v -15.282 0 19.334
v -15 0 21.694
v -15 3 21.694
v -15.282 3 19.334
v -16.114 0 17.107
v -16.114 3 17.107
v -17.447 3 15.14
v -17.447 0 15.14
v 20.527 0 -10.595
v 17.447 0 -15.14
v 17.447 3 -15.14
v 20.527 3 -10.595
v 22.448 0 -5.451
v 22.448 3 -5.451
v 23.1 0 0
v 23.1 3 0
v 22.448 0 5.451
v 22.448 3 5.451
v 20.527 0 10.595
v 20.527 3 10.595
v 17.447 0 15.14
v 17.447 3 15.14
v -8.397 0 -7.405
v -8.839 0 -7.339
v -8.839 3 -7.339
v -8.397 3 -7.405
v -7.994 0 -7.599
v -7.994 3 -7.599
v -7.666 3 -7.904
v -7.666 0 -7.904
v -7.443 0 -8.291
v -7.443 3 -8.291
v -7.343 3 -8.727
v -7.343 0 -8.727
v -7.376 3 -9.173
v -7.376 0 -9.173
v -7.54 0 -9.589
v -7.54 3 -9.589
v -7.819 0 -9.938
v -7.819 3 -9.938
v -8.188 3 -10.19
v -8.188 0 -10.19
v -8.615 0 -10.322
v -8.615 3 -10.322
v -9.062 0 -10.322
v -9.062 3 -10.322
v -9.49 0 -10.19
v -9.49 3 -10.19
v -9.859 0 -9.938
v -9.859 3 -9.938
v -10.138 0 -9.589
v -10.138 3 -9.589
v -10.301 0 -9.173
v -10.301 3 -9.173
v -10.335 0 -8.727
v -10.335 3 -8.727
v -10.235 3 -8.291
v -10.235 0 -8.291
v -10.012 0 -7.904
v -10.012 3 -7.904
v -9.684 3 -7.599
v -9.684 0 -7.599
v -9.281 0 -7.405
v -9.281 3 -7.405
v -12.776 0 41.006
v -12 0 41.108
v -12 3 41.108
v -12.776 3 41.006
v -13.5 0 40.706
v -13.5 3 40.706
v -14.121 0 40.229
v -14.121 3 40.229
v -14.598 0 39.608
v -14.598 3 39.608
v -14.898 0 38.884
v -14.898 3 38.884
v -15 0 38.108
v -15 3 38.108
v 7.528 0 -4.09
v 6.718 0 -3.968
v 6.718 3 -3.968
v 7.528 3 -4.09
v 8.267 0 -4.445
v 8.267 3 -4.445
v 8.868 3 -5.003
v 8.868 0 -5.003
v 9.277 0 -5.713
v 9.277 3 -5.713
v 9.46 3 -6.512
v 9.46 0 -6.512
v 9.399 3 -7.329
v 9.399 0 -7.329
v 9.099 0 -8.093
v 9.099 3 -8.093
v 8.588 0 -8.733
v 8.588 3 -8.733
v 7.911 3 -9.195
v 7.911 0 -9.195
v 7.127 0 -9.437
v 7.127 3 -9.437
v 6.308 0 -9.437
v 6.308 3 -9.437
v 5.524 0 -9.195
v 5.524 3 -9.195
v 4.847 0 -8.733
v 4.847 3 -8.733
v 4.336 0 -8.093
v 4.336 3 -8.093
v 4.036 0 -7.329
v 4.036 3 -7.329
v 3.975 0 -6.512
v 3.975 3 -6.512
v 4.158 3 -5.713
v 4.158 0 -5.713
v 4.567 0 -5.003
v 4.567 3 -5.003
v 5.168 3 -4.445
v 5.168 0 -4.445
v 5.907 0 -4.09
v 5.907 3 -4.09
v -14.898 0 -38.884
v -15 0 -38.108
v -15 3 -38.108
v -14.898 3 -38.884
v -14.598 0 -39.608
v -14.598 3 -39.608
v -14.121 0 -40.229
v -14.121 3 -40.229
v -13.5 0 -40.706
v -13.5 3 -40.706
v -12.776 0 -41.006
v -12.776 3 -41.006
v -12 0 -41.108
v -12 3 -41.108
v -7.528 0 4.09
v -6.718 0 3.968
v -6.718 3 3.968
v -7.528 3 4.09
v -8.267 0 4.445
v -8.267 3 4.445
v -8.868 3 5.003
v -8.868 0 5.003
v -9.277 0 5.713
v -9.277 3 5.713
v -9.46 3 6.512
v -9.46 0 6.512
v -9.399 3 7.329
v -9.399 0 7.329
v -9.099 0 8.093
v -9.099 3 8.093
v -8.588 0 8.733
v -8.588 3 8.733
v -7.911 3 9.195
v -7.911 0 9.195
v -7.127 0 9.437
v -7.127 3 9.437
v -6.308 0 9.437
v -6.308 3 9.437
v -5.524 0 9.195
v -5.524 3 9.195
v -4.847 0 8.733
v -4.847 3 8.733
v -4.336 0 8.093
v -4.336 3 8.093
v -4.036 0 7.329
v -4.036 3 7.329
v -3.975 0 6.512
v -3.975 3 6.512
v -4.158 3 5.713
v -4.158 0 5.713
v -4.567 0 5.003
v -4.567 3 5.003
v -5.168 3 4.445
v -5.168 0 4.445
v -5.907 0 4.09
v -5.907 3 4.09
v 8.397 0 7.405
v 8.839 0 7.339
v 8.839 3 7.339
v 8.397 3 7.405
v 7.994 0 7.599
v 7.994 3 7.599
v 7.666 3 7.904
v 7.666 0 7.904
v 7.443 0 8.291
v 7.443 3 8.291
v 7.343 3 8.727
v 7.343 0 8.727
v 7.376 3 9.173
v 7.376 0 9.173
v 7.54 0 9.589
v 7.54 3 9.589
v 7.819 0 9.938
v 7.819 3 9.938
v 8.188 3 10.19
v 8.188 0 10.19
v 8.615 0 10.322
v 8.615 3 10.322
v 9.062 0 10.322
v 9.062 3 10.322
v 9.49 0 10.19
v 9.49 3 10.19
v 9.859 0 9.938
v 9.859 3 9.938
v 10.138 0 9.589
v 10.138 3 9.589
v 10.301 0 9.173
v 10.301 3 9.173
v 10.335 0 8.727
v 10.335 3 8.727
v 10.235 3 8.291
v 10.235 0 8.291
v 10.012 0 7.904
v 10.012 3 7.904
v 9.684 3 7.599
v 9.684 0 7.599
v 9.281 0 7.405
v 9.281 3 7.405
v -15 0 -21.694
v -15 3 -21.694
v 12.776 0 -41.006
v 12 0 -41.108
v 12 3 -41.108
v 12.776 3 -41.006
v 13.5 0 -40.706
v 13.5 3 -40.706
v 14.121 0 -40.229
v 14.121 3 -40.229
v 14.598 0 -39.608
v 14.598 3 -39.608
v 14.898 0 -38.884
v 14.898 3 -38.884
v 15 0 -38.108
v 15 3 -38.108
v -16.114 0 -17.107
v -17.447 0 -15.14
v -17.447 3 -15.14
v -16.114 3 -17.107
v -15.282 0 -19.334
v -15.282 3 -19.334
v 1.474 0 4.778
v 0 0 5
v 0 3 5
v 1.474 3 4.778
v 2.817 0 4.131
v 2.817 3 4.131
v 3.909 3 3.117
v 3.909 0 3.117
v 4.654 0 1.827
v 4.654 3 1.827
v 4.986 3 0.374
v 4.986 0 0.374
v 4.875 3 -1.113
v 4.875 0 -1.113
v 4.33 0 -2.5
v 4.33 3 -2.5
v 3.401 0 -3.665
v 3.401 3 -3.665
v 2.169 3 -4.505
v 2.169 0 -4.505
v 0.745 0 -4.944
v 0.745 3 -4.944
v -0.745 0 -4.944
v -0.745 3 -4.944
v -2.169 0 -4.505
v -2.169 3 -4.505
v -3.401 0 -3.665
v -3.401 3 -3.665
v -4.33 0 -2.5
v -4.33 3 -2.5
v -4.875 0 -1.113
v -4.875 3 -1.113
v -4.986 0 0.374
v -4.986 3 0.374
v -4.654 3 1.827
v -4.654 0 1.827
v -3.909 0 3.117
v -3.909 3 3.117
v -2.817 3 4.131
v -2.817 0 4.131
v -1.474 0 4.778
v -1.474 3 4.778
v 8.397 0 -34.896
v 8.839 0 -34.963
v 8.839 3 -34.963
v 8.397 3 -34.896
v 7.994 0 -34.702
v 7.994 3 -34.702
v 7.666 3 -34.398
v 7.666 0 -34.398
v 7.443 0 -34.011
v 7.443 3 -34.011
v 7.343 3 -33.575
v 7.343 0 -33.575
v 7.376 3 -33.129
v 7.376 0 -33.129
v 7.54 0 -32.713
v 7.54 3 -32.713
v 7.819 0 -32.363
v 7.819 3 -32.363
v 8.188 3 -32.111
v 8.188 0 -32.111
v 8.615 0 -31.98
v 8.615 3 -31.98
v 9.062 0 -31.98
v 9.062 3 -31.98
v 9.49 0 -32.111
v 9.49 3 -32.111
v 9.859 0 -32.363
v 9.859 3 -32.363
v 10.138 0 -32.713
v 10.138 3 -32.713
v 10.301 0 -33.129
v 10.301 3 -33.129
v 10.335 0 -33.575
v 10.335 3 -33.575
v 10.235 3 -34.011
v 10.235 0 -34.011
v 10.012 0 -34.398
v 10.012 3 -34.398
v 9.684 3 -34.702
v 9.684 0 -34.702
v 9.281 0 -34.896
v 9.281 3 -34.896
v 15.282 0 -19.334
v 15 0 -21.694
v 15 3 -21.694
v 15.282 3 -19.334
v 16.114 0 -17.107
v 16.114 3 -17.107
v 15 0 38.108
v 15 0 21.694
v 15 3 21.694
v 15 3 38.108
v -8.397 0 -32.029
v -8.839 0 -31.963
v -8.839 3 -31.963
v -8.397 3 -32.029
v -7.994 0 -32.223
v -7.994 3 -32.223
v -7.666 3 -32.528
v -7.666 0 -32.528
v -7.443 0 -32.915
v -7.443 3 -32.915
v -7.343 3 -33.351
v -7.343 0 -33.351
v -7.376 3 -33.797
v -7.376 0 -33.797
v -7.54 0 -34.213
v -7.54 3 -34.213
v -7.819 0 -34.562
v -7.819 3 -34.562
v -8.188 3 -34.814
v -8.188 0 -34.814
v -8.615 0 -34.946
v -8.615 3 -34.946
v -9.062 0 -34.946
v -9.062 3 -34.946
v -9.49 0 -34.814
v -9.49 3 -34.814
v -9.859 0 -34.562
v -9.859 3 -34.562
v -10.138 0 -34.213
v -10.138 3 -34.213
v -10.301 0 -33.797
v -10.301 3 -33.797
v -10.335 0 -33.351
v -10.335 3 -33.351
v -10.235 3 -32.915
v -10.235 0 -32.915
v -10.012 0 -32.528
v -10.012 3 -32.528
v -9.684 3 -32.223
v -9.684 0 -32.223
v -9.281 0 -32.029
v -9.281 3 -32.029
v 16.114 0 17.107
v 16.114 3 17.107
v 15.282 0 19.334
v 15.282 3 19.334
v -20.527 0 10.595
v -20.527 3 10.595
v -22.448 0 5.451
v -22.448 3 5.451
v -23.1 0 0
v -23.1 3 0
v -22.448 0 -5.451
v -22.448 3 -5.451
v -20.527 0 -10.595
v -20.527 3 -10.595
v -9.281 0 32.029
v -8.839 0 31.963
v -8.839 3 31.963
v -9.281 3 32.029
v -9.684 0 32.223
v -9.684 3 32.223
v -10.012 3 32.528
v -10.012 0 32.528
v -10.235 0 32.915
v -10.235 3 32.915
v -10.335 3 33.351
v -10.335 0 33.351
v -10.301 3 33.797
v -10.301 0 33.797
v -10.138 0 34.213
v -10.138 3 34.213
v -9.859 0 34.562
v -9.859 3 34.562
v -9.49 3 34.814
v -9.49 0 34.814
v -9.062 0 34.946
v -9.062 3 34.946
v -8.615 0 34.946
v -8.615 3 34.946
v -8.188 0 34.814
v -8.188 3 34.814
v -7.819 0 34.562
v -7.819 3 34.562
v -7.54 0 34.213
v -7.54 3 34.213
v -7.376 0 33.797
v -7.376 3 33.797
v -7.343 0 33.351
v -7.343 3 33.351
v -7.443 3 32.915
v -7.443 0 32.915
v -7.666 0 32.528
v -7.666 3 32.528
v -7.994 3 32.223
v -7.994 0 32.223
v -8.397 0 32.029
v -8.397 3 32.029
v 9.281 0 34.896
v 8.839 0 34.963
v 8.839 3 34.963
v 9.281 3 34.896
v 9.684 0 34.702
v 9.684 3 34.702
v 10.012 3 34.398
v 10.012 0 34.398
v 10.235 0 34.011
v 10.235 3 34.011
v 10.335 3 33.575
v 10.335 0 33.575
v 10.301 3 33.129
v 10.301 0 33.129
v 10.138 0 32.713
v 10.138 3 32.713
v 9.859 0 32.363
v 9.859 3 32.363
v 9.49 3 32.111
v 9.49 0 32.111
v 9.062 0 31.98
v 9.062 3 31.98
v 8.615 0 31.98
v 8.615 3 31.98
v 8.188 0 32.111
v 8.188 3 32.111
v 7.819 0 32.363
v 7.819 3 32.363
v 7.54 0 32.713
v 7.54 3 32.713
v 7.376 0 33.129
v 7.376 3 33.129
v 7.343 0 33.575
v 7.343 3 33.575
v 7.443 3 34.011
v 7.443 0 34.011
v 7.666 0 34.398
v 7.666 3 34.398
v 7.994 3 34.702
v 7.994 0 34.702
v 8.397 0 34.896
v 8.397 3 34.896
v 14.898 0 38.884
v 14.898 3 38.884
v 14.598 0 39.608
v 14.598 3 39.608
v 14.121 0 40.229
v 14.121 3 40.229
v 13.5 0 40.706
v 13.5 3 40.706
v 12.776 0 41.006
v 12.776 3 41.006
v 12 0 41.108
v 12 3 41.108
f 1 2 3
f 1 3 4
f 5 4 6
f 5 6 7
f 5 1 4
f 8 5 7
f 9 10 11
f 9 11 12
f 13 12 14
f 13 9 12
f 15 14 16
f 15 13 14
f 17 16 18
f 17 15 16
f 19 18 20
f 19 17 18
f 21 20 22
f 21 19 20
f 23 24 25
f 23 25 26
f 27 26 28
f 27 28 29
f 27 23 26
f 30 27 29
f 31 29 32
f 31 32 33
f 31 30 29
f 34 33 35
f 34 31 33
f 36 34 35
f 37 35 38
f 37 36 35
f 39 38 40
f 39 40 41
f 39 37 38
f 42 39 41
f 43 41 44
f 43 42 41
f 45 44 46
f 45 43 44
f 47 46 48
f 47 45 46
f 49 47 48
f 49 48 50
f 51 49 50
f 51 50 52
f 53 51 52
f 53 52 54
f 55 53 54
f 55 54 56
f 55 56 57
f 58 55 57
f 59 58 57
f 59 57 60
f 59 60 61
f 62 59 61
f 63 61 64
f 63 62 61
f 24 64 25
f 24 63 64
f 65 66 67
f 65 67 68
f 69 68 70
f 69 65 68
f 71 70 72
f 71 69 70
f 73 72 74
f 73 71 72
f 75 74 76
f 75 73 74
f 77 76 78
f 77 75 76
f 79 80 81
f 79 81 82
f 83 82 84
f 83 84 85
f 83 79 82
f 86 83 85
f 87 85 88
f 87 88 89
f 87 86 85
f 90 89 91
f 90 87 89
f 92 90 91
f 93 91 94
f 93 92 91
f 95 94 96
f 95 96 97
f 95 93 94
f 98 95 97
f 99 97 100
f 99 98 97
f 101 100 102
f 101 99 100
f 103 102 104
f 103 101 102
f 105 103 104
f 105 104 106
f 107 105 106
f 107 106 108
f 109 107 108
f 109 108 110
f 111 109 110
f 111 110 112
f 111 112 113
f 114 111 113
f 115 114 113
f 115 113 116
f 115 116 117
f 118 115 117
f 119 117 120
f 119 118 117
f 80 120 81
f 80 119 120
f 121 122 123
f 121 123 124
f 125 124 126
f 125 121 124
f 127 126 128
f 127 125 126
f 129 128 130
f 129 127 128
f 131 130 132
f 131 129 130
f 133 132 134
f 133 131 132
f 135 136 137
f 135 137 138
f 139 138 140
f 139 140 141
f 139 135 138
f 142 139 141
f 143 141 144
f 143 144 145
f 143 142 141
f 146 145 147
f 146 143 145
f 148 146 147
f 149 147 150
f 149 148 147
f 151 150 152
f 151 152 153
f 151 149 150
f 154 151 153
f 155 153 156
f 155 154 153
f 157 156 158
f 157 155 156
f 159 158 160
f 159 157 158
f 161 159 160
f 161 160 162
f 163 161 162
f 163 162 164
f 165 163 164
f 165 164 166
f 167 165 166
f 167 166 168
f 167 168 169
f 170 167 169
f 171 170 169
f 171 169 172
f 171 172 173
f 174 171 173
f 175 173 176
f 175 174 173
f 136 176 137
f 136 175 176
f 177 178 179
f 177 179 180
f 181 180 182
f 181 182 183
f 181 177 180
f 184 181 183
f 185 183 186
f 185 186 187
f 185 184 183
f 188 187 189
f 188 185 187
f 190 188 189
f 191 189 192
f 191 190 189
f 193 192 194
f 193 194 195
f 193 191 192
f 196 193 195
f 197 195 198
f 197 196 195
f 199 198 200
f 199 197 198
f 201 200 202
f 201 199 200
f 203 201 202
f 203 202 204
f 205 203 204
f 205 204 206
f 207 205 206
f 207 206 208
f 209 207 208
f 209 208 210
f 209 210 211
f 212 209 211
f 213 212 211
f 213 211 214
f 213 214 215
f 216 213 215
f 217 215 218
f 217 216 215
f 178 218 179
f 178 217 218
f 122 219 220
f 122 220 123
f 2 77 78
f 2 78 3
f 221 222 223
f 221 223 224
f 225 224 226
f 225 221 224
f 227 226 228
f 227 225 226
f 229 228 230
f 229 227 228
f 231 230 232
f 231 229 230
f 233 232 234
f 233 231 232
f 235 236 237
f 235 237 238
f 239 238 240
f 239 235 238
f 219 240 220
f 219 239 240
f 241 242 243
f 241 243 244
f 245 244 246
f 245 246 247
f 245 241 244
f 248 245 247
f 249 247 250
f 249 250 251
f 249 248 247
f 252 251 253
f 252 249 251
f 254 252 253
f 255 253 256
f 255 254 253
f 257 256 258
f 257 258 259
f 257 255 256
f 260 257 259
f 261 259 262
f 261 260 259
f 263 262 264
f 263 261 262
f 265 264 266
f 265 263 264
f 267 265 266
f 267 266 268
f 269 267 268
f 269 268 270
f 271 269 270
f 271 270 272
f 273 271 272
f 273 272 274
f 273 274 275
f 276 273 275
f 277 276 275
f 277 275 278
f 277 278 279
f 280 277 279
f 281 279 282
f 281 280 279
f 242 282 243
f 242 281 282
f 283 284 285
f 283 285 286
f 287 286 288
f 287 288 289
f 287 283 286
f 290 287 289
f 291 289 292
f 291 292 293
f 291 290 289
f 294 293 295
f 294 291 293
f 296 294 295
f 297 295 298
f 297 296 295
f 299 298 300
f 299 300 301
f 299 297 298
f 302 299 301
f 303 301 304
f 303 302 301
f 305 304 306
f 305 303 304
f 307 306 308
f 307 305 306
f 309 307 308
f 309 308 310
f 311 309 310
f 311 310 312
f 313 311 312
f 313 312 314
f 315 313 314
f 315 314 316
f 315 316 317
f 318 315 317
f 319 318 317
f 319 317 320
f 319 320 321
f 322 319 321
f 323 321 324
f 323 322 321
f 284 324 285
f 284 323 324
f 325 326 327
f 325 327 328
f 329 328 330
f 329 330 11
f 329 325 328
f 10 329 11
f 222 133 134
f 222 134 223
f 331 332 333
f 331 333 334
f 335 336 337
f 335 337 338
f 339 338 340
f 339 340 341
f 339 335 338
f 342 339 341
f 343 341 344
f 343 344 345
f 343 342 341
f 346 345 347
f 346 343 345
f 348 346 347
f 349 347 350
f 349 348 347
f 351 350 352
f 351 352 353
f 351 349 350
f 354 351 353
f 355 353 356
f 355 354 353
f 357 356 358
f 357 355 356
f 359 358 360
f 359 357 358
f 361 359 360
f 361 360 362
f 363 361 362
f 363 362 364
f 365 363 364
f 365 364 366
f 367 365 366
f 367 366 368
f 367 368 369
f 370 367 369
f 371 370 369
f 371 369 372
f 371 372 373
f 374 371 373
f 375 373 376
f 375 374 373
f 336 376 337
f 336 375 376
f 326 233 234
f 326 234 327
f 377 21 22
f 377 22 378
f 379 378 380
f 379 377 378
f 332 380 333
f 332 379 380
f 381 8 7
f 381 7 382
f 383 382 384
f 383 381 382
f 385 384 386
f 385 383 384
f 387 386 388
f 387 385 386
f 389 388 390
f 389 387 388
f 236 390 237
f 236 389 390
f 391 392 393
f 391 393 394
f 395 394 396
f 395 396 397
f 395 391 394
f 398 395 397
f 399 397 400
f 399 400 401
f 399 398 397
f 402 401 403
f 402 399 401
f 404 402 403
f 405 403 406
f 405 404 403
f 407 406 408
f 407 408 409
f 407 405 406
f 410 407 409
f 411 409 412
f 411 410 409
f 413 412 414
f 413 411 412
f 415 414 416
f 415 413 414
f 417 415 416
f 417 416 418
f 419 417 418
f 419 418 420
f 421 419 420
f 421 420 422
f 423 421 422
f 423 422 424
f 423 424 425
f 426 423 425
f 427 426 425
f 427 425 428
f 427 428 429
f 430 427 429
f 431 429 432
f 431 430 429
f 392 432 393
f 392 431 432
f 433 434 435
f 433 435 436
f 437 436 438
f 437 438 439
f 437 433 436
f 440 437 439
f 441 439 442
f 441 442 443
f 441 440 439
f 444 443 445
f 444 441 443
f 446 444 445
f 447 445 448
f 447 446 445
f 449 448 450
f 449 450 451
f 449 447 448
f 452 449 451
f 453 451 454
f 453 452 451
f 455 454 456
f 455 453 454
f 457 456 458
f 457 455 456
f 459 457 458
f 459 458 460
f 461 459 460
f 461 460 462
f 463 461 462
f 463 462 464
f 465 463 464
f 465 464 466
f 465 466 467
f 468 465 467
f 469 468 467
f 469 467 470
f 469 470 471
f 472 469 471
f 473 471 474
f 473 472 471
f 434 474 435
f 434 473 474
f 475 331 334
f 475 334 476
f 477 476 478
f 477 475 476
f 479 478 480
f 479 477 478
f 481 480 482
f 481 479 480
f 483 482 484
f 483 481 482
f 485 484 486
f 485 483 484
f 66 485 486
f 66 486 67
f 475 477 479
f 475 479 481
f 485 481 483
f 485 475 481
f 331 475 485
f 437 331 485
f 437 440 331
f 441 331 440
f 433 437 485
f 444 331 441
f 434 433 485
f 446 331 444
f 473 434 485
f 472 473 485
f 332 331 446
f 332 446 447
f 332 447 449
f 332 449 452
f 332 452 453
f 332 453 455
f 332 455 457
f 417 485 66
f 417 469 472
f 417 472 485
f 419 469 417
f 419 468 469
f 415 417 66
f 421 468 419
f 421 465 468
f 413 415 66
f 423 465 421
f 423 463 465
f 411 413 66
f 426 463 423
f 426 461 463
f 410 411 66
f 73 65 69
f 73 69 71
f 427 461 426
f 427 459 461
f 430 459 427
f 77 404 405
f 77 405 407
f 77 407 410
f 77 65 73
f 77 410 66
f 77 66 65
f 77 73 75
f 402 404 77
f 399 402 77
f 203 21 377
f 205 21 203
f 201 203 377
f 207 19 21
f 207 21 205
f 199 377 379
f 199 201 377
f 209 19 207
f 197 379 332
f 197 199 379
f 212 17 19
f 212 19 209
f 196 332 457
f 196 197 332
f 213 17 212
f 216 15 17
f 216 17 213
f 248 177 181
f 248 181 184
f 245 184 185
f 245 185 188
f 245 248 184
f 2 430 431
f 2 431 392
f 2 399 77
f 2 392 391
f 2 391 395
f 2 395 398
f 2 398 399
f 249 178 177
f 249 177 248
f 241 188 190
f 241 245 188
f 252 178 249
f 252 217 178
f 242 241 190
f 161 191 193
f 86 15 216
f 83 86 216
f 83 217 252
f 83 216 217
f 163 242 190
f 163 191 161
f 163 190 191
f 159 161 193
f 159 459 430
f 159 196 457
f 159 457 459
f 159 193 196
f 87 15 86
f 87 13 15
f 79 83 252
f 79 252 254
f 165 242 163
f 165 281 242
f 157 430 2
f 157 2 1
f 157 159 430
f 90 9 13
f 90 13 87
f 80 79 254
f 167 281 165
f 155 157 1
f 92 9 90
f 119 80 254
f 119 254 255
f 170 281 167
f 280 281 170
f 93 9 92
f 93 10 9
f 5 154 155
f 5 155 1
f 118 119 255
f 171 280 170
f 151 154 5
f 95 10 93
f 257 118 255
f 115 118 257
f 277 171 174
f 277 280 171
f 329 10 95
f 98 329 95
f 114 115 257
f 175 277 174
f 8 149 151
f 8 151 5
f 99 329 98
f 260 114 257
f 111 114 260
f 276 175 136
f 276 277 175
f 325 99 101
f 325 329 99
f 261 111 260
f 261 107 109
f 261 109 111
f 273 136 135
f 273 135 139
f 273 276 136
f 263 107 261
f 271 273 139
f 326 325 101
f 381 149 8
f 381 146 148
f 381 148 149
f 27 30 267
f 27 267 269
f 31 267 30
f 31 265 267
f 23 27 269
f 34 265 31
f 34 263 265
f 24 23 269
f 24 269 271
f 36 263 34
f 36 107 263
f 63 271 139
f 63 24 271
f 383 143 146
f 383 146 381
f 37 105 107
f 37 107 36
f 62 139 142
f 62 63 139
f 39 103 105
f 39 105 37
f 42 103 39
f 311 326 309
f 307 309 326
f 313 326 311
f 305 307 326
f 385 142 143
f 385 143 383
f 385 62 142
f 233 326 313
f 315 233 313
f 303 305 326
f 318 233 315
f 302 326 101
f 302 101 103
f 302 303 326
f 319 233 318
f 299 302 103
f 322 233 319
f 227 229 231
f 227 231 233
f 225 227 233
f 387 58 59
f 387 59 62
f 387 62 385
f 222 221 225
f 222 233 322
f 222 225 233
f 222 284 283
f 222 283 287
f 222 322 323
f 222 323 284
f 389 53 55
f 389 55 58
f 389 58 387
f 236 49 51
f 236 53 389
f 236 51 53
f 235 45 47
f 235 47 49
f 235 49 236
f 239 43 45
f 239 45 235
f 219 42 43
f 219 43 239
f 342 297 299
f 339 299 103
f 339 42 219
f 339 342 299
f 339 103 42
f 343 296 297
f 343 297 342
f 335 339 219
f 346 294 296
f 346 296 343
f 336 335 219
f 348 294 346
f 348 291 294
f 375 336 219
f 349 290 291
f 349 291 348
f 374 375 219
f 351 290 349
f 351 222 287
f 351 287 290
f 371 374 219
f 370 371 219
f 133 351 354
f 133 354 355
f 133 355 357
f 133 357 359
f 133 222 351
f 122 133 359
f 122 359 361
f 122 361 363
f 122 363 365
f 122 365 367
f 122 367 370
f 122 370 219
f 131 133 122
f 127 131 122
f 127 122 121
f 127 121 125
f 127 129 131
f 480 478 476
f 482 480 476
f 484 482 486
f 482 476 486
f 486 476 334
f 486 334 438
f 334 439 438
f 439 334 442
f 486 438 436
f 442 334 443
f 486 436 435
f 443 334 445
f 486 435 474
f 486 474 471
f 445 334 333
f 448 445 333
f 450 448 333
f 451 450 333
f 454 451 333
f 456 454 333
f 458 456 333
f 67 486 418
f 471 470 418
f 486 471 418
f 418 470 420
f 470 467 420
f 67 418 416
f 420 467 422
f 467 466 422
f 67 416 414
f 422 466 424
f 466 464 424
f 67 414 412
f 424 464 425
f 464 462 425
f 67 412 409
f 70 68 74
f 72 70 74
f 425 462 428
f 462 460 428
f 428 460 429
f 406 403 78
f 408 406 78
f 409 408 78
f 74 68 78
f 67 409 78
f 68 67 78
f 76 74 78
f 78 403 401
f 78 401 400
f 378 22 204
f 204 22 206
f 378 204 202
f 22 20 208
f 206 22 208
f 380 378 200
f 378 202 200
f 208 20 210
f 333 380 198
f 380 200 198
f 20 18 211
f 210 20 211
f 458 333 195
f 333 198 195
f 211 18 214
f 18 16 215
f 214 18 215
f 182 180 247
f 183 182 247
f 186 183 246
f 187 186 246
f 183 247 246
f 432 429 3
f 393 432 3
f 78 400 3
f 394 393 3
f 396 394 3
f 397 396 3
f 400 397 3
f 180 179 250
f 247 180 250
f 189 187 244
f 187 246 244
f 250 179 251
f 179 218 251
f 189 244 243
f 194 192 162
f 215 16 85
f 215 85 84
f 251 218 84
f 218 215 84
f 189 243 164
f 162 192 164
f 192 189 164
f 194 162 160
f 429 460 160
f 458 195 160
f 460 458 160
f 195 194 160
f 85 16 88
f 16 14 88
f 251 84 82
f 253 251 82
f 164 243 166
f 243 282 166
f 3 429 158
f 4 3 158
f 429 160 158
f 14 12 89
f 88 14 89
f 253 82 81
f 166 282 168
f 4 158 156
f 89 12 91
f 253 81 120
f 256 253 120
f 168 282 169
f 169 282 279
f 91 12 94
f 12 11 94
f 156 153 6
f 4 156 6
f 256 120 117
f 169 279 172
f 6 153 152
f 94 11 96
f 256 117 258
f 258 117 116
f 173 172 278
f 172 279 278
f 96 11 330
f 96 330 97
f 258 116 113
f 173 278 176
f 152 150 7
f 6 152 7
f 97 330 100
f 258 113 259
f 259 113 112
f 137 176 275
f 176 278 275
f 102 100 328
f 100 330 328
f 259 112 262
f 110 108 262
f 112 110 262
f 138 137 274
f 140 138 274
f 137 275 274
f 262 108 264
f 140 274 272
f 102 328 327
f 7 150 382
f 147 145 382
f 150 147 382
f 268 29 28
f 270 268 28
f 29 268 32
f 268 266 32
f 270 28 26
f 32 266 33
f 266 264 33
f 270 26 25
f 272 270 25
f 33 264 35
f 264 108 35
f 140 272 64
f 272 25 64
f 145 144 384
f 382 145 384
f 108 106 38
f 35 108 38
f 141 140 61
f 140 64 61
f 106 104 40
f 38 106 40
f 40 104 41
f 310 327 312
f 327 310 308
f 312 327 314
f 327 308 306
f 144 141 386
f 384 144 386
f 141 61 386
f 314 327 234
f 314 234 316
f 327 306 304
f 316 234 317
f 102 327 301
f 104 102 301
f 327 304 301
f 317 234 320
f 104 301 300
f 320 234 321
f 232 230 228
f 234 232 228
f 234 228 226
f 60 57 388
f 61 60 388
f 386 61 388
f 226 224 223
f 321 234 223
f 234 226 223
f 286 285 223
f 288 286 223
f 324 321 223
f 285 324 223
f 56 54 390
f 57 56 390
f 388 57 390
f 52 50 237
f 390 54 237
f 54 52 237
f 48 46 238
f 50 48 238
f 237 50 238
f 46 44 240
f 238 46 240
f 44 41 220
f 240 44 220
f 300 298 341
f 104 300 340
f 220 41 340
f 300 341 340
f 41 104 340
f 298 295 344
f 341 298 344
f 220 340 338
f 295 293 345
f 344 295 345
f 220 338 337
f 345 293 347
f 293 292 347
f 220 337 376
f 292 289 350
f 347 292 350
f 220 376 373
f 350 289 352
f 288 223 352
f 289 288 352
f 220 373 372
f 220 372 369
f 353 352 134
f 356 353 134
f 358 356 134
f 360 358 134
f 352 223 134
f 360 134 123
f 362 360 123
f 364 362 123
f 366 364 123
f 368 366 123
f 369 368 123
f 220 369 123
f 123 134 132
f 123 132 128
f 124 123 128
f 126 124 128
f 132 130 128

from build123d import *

# Parameters (mm, degrees)
SKETCH1_R           = 1.5
SKETCH1_R_2         = 2.75
SKETCH1_R_3         = 5
BOSS_EXTRUDE1_DEPTH = 3


with BuildPart() as part:
    # Sketch1 → Boss-Extrude1 (new body)
    with BuildSketch(Plane(origin=(0, 0, 0), x_dir=(1, 0, 0), z_dir=(0, 1, 0))):
        with BuildLine():
            Line((-15, 21.693547428), (-15, 38.108016468))
            ThreePointArc((-15, 38.108016468), (-14.121320344, 40.229336812), (-12, 41.108016468))
            Line((-12, 41.108016468), (12, 41.108016468))
            ThreePointArc((12, 41.108016468), (14.121320344, 40.229336812), (15, 38.108016468))
            Line((15, 38.108016468), (15, 21.693547428))
            ThreePointArc((15, 21.693547428), (15.631737063, 18.195598093), (17.447129909, 15.139605607))
            ThreePointArc((17.447129909, 15.139605607), (23.1, 0), (17.447129909, -15.139605607))
            ThreePointArc((17.447129909, -15.139605607), (15.631737063, -18.195598093), (15, -21.693547428))
            Line((15, -21.693547428), (15, -38.108016468))
            ThreePointArc((15, -38.108016468), (14.121320344, -40.229336812), (12, -41.108016468))
            Line((12, -41.108016468), (-12, -41.108016468))
            ThreePointArc((-12, -41.108016468), (-14.121320344, -40.229336812), (-15, -38.108016468))
            Line((-15, -38.108016468), (-15, -21.693547428))
            ThreePointArc((-15, -21.693547428), (-15.631737063, -18.195598093), (-17.447129909, -15.139605607))
            ThreePointArc((-17.447129909, -15.139605607), (-23.1, 0), (-17.447129909, 15.139605607))
            ThreePointArc((-17.447129909, 15.139605607), (-15.631737063, 18.195598093), (-15, 21.693547428))
        make_face()
        with Locations(Location((-8.838834765, 8.838834765, 0), (0, 0, 270))):
            Circle(SKETCH1_R, mode=Mode.SUBTRACT)
        with Locations(Location((8.838834765, -8.838834765, 0), (0, 0, 90))):
            Circle(SKETCH1_R, mode=Mode.SUBTRACT)
        with Locations(Location((6.717514421, 6.717514421, 0), (0, 0, 270))):
            Circle(SKETCH1_R_2, mode=Mode.SUBTRACT)
        with Locations(Location((-6.717514421, -6.717514421, 0), (0, 0, 90))):
            Circle(SKETCH1_R_2, mode=Mode.SUBTRACT)
        with Locations(Location((0, 0, 0), (0, 0, 270))):
            Circle(SKETCH1_R_3, mode=Mode.SUBTRACT)
        with Locations(Location((-8.838834765, 33.462792438, 0), (0, 0, 270))):
            Circle(SKETCH1_R, mode=Mode.SUBTRACT)
        with Locations(Location((8.838834765, 33.462792438, 0), (0, 0, 90))):
            Circle(SKETCH1_R, mode=Mode.SUBTRACT)
        with Locations(Location((8.838834765, -33.462792438, 0), (0, 0, 270))):
            Circle(SKETCH1_R, mode=Mode.SUBTRACT)
        with Locations(Location((-8.838834765, -33.462792438, 0), (0, 0, 90))):
            Circle(SKETCH1_R, mode=Mode.SUBTRACT)
    extrude(amount=BOSS_EXTRUDE1_DEPTH)


solid = part.part
